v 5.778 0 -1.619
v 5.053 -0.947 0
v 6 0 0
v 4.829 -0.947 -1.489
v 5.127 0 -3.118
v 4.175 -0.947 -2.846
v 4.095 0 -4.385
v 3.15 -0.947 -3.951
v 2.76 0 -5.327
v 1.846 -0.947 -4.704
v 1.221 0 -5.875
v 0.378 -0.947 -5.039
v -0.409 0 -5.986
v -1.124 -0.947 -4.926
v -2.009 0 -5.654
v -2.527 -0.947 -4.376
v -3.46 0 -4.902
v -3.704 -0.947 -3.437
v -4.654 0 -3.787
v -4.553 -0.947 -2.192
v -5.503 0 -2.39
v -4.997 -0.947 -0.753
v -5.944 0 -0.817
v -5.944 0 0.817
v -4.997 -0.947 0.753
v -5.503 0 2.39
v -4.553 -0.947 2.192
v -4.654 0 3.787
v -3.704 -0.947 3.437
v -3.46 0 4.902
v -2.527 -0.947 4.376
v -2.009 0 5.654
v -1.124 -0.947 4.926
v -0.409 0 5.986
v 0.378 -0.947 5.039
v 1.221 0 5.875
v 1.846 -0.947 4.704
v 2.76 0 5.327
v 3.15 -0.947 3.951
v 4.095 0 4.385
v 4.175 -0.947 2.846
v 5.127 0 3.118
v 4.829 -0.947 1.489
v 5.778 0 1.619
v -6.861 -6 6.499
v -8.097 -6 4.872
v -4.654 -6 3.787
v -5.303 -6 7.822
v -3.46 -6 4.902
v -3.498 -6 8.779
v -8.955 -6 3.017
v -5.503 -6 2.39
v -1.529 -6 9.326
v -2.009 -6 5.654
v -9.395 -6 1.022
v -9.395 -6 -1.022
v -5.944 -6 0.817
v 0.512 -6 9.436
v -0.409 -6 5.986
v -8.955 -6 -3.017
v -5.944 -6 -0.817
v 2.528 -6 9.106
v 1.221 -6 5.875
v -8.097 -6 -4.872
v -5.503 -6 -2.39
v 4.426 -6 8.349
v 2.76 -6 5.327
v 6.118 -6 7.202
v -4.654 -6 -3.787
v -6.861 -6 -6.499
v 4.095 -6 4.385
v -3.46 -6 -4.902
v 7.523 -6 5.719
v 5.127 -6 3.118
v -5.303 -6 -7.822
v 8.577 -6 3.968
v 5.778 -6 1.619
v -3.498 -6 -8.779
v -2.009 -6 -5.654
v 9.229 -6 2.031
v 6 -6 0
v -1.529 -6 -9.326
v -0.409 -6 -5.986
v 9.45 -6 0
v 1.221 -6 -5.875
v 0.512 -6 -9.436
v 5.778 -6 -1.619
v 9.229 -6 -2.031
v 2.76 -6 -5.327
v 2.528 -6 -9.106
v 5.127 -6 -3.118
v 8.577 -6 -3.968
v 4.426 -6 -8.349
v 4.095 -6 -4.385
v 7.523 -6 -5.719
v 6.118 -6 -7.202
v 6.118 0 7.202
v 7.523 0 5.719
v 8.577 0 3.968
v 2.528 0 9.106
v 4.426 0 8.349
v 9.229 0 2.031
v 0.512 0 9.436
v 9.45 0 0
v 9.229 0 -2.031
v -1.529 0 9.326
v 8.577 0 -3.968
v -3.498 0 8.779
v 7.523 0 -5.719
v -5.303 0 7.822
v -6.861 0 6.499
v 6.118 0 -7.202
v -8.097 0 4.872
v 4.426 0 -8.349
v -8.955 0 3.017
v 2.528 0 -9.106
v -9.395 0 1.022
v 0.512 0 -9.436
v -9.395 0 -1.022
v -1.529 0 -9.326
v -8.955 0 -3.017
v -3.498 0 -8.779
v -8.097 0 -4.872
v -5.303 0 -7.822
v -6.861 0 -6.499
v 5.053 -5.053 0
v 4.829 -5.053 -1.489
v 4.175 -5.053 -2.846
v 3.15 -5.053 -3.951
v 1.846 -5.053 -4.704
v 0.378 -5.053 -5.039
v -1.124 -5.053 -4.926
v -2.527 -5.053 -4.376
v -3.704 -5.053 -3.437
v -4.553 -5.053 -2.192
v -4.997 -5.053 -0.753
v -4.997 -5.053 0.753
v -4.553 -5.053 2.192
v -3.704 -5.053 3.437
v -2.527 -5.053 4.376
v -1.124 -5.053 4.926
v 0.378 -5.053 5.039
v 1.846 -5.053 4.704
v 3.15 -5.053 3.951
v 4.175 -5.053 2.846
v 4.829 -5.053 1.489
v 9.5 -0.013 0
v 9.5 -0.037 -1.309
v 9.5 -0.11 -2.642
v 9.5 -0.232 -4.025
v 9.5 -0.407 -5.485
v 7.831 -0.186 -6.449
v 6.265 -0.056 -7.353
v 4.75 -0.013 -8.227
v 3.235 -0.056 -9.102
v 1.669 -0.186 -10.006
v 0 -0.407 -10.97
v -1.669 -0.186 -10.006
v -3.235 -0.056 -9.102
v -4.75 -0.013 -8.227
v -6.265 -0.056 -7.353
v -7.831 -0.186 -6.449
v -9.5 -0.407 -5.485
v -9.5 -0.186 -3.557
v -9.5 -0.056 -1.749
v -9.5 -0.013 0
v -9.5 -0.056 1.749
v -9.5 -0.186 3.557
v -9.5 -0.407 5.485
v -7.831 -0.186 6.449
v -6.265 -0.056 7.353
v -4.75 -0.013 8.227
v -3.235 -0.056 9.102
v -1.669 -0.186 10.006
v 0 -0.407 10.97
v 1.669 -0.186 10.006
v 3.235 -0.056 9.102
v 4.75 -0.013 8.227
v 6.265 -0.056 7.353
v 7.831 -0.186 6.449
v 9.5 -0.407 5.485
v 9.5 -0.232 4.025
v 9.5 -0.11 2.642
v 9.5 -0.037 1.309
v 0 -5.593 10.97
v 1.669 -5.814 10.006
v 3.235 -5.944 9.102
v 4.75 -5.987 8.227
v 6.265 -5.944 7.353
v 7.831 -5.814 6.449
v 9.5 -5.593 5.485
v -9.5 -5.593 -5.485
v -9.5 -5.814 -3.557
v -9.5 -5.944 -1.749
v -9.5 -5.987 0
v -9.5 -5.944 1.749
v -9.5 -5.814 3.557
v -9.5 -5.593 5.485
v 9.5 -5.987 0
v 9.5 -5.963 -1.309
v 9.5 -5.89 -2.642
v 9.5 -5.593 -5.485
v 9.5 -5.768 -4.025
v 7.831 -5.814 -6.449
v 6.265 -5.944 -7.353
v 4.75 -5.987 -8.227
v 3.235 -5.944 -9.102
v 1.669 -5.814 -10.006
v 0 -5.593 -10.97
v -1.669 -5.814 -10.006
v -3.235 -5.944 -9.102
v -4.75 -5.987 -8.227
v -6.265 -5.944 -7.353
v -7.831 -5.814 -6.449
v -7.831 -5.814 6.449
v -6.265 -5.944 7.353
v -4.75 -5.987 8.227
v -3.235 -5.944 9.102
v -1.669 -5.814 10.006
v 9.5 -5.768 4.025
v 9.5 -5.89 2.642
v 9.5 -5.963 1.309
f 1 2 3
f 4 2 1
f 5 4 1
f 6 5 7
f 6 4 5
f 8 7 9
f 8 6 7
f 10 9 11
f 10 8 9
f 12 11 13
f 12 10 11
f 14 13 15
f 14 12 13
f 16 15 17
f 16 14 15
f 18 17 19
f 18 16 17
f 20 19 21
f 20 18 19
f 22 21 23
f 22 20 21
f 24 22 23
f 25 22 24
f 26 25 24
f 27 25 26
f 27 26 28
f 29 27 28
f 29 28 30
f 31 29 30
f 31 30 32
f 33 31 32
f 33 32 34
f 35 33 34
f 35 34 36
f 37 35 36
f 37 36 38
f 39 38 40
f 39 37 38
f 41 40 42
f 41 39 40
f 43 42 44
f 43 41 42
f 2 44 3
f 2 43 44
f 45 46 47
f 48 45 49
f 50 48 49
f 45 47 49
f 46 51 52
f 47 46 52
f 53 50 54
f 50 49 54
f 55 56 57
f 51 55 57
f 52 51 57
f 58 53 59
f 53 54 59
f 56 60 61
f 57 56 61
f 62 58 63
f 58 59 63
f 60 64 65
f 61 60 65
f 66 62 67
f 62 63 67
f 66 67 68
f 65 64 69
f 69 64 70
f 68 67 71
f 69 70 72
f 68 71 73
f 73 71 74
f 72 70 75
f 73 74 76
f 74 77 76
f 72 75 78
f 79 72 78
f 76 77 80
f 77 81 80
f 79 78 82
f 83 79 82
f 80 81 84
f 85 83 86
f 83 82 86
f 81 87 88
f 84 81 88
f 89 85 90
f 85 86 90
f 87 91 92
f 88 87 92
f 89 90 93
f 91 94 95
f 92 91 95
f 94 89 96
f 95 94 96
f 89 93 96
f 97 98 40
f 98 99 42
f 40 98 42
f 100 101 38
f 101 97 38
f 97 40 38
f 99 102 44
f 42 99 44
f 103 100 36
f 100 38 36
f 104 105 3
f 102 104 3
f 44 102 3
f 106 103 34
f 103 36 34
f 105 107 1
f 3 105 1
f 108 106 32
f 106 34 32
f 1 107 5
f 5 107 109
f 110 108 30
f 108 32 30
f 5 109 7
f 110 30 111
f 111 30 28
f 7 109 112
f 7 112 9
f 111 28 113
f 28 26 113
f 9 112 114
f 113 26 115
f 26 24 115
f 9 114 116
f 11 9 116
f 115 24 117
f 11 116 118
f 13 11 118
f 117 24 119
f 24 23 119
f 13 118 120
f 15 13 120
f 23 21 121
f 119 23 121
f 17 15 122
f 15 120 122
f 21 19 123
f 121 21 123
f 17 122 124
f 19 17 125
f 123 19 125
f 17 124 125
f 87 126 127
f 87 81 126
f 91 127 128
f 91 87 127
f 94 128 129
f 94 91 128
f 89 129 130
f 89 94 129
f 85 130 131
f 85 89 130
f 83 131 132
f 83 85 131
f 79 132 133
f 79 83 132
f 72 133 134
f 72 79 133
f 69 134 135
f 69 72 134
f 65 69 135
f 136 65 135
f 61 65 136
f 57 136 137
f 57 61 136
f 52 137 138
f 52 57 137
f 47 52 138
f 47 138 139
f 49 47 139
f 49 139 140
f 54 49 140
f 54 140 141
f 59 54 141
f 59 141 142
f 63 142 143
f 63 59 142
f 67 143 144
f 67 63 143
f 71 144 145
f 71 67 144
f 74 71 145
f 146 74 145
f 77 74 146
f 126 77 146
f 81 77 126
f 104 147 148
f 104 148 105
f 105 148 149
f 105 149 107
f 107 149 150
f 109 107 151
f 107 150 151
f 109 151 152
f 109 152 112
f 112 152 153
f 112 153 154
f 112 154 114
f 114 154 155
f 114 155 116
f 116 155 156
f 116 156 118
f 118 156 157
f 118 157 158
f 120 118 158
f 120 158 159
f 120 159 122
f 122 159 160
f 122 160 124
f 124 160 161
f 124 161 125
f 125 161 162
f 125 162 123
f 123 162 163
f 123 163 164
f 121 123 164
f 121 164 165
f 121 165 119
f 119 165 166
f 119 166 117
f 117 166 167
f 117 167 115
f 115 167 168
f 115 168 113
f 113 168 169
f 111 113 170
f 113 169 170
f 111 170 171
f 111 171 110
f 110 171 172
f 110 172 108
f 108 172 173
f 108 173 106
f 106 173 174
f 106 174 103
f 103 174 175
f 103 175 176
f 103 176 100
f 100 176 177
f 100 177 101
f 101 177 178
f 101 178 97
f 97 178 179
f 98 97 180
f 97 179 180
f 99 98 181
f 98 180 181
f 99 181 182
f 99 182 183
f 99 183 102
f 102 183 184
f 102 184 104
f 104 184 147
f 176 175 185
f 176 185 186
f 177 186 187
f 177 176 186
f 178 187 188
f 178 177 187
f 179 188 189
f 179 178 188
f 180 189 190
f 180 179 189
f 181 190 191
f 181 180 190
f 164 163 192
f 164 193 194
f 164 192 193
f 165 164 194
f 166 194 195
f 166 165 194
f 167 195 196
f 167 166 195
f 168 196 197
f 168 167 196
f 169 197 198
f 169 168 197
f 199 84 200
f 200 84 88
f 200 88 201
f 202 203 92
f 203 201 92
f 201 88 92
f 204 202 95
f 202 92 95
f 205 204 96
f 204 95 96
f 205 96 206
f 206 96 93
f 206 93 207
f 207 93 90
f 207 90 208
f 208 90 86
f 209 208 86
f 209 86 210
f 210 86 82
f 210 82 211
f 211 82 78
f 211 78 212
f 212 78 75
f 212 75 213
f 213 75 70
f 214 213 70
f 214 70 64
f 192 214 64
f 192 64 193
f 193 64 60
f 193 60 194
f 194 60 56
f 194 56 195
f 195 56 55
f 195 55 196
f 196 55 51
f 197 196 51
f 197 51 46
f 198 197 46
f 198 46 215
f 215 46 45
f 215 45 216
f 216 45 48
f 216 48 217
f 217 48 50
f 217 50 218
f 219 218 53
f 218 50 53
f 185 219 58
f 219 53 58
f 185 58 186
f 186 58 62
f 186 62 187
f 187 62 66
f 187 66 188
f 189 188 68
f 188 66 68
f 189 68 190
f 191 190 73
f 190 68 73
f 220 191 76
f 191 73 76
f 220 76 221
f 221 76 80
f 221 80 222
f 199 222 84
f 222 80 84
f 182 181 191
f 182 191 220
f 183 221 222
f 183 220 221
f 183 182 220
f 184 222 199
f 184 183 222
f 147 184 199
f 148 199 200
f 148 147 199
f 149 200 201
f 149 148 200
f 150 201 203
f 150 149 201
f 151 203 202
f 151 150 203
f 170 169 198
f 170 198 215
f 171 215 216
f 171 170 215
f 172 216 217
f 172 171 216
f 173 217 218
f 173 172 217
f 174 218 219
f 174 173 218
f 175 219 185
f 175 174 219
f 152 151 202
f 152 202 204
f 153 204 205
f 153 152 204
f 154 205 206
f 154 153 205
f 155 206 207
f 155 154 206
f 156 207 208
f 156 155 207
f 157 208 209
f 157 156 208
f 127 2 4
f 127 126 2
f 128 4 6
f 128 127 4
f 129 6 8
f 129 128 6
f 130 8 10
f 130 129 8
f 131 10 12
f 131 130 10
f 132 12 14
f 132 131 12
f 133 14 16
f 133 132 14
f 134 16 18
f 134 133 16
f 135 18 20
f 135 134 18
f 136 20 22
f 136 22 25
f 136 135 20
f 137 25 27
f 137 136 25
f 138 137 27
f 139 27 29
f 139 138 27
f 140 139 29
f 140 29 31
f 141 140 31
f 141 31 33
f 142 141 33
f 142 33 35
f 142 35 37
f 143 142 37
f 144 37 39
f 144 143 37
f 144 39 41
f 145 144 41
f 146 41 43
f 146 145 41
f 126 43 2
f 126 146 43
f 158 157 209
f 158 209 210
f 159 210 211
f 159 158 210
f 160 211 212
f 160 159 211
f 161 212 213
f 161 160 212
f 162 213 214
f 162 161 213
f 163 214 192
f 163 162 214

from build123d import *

# Parameters (mm, degrees)
CUT_EXTRUDE1_DEPTH      = 7
CUT_EXTRUDE1_DEPTH_BACK = 7
SKETCH2_W               = 76
SKETCH2_H               = 76


with BuildPart() as part:
    # Sketch1 → Revolve1 (revolve)
    with BuildSketch(Plane.XY):
        Polygon((0, 0), (9.45, 0), (20.646152423, -3), (9.45, -6), (0, -6), align=None)
    revolve(axis=Axis((0, -6, 0), (0, 1, 0)))

    # Sketch2 → Cut-Extrude1 (cut, two sides: drawn at the far end of the back side and taken through both)
    with BuildSketch(Plane(origin=(0, 0, 0), x_dir=(1, 0, 0), z_dir=(0, 1, 0)).offset(-CUT_EXTRUDE1_DEPTH_BACK)):
        Rectangle(SKETCH2_W, SKETCH2_H)
        Polygon((-9.5, -5.484827557), (0, -10.969655115), (9.5, -5.484827557), (9.5, 5.484827557), (0, 10.969655115), (-9.5, 5.484827557), align=None, mode=Mode.SUBTRACT)
    extrude(amount=CUT_EXTRUDE1_DEPTH + CUT_EXTRUDE1_DEPTH_BACK, mode=Mode.SUBTRACT)

    # Sketch3 → Cut-Revolve1 (revolve, cut)
    with BuildSketch(Plane.XY):
        Polygon((0, 0), (6, 0), (5.053, -0.947), (5.053, -5.053), (6, -6), (0, -6), align=None)
    revolve(axis=Axis((0, -6, 0), (0, 1, 0)), mode=Mode.SUBTRACT)


solid = part.part
